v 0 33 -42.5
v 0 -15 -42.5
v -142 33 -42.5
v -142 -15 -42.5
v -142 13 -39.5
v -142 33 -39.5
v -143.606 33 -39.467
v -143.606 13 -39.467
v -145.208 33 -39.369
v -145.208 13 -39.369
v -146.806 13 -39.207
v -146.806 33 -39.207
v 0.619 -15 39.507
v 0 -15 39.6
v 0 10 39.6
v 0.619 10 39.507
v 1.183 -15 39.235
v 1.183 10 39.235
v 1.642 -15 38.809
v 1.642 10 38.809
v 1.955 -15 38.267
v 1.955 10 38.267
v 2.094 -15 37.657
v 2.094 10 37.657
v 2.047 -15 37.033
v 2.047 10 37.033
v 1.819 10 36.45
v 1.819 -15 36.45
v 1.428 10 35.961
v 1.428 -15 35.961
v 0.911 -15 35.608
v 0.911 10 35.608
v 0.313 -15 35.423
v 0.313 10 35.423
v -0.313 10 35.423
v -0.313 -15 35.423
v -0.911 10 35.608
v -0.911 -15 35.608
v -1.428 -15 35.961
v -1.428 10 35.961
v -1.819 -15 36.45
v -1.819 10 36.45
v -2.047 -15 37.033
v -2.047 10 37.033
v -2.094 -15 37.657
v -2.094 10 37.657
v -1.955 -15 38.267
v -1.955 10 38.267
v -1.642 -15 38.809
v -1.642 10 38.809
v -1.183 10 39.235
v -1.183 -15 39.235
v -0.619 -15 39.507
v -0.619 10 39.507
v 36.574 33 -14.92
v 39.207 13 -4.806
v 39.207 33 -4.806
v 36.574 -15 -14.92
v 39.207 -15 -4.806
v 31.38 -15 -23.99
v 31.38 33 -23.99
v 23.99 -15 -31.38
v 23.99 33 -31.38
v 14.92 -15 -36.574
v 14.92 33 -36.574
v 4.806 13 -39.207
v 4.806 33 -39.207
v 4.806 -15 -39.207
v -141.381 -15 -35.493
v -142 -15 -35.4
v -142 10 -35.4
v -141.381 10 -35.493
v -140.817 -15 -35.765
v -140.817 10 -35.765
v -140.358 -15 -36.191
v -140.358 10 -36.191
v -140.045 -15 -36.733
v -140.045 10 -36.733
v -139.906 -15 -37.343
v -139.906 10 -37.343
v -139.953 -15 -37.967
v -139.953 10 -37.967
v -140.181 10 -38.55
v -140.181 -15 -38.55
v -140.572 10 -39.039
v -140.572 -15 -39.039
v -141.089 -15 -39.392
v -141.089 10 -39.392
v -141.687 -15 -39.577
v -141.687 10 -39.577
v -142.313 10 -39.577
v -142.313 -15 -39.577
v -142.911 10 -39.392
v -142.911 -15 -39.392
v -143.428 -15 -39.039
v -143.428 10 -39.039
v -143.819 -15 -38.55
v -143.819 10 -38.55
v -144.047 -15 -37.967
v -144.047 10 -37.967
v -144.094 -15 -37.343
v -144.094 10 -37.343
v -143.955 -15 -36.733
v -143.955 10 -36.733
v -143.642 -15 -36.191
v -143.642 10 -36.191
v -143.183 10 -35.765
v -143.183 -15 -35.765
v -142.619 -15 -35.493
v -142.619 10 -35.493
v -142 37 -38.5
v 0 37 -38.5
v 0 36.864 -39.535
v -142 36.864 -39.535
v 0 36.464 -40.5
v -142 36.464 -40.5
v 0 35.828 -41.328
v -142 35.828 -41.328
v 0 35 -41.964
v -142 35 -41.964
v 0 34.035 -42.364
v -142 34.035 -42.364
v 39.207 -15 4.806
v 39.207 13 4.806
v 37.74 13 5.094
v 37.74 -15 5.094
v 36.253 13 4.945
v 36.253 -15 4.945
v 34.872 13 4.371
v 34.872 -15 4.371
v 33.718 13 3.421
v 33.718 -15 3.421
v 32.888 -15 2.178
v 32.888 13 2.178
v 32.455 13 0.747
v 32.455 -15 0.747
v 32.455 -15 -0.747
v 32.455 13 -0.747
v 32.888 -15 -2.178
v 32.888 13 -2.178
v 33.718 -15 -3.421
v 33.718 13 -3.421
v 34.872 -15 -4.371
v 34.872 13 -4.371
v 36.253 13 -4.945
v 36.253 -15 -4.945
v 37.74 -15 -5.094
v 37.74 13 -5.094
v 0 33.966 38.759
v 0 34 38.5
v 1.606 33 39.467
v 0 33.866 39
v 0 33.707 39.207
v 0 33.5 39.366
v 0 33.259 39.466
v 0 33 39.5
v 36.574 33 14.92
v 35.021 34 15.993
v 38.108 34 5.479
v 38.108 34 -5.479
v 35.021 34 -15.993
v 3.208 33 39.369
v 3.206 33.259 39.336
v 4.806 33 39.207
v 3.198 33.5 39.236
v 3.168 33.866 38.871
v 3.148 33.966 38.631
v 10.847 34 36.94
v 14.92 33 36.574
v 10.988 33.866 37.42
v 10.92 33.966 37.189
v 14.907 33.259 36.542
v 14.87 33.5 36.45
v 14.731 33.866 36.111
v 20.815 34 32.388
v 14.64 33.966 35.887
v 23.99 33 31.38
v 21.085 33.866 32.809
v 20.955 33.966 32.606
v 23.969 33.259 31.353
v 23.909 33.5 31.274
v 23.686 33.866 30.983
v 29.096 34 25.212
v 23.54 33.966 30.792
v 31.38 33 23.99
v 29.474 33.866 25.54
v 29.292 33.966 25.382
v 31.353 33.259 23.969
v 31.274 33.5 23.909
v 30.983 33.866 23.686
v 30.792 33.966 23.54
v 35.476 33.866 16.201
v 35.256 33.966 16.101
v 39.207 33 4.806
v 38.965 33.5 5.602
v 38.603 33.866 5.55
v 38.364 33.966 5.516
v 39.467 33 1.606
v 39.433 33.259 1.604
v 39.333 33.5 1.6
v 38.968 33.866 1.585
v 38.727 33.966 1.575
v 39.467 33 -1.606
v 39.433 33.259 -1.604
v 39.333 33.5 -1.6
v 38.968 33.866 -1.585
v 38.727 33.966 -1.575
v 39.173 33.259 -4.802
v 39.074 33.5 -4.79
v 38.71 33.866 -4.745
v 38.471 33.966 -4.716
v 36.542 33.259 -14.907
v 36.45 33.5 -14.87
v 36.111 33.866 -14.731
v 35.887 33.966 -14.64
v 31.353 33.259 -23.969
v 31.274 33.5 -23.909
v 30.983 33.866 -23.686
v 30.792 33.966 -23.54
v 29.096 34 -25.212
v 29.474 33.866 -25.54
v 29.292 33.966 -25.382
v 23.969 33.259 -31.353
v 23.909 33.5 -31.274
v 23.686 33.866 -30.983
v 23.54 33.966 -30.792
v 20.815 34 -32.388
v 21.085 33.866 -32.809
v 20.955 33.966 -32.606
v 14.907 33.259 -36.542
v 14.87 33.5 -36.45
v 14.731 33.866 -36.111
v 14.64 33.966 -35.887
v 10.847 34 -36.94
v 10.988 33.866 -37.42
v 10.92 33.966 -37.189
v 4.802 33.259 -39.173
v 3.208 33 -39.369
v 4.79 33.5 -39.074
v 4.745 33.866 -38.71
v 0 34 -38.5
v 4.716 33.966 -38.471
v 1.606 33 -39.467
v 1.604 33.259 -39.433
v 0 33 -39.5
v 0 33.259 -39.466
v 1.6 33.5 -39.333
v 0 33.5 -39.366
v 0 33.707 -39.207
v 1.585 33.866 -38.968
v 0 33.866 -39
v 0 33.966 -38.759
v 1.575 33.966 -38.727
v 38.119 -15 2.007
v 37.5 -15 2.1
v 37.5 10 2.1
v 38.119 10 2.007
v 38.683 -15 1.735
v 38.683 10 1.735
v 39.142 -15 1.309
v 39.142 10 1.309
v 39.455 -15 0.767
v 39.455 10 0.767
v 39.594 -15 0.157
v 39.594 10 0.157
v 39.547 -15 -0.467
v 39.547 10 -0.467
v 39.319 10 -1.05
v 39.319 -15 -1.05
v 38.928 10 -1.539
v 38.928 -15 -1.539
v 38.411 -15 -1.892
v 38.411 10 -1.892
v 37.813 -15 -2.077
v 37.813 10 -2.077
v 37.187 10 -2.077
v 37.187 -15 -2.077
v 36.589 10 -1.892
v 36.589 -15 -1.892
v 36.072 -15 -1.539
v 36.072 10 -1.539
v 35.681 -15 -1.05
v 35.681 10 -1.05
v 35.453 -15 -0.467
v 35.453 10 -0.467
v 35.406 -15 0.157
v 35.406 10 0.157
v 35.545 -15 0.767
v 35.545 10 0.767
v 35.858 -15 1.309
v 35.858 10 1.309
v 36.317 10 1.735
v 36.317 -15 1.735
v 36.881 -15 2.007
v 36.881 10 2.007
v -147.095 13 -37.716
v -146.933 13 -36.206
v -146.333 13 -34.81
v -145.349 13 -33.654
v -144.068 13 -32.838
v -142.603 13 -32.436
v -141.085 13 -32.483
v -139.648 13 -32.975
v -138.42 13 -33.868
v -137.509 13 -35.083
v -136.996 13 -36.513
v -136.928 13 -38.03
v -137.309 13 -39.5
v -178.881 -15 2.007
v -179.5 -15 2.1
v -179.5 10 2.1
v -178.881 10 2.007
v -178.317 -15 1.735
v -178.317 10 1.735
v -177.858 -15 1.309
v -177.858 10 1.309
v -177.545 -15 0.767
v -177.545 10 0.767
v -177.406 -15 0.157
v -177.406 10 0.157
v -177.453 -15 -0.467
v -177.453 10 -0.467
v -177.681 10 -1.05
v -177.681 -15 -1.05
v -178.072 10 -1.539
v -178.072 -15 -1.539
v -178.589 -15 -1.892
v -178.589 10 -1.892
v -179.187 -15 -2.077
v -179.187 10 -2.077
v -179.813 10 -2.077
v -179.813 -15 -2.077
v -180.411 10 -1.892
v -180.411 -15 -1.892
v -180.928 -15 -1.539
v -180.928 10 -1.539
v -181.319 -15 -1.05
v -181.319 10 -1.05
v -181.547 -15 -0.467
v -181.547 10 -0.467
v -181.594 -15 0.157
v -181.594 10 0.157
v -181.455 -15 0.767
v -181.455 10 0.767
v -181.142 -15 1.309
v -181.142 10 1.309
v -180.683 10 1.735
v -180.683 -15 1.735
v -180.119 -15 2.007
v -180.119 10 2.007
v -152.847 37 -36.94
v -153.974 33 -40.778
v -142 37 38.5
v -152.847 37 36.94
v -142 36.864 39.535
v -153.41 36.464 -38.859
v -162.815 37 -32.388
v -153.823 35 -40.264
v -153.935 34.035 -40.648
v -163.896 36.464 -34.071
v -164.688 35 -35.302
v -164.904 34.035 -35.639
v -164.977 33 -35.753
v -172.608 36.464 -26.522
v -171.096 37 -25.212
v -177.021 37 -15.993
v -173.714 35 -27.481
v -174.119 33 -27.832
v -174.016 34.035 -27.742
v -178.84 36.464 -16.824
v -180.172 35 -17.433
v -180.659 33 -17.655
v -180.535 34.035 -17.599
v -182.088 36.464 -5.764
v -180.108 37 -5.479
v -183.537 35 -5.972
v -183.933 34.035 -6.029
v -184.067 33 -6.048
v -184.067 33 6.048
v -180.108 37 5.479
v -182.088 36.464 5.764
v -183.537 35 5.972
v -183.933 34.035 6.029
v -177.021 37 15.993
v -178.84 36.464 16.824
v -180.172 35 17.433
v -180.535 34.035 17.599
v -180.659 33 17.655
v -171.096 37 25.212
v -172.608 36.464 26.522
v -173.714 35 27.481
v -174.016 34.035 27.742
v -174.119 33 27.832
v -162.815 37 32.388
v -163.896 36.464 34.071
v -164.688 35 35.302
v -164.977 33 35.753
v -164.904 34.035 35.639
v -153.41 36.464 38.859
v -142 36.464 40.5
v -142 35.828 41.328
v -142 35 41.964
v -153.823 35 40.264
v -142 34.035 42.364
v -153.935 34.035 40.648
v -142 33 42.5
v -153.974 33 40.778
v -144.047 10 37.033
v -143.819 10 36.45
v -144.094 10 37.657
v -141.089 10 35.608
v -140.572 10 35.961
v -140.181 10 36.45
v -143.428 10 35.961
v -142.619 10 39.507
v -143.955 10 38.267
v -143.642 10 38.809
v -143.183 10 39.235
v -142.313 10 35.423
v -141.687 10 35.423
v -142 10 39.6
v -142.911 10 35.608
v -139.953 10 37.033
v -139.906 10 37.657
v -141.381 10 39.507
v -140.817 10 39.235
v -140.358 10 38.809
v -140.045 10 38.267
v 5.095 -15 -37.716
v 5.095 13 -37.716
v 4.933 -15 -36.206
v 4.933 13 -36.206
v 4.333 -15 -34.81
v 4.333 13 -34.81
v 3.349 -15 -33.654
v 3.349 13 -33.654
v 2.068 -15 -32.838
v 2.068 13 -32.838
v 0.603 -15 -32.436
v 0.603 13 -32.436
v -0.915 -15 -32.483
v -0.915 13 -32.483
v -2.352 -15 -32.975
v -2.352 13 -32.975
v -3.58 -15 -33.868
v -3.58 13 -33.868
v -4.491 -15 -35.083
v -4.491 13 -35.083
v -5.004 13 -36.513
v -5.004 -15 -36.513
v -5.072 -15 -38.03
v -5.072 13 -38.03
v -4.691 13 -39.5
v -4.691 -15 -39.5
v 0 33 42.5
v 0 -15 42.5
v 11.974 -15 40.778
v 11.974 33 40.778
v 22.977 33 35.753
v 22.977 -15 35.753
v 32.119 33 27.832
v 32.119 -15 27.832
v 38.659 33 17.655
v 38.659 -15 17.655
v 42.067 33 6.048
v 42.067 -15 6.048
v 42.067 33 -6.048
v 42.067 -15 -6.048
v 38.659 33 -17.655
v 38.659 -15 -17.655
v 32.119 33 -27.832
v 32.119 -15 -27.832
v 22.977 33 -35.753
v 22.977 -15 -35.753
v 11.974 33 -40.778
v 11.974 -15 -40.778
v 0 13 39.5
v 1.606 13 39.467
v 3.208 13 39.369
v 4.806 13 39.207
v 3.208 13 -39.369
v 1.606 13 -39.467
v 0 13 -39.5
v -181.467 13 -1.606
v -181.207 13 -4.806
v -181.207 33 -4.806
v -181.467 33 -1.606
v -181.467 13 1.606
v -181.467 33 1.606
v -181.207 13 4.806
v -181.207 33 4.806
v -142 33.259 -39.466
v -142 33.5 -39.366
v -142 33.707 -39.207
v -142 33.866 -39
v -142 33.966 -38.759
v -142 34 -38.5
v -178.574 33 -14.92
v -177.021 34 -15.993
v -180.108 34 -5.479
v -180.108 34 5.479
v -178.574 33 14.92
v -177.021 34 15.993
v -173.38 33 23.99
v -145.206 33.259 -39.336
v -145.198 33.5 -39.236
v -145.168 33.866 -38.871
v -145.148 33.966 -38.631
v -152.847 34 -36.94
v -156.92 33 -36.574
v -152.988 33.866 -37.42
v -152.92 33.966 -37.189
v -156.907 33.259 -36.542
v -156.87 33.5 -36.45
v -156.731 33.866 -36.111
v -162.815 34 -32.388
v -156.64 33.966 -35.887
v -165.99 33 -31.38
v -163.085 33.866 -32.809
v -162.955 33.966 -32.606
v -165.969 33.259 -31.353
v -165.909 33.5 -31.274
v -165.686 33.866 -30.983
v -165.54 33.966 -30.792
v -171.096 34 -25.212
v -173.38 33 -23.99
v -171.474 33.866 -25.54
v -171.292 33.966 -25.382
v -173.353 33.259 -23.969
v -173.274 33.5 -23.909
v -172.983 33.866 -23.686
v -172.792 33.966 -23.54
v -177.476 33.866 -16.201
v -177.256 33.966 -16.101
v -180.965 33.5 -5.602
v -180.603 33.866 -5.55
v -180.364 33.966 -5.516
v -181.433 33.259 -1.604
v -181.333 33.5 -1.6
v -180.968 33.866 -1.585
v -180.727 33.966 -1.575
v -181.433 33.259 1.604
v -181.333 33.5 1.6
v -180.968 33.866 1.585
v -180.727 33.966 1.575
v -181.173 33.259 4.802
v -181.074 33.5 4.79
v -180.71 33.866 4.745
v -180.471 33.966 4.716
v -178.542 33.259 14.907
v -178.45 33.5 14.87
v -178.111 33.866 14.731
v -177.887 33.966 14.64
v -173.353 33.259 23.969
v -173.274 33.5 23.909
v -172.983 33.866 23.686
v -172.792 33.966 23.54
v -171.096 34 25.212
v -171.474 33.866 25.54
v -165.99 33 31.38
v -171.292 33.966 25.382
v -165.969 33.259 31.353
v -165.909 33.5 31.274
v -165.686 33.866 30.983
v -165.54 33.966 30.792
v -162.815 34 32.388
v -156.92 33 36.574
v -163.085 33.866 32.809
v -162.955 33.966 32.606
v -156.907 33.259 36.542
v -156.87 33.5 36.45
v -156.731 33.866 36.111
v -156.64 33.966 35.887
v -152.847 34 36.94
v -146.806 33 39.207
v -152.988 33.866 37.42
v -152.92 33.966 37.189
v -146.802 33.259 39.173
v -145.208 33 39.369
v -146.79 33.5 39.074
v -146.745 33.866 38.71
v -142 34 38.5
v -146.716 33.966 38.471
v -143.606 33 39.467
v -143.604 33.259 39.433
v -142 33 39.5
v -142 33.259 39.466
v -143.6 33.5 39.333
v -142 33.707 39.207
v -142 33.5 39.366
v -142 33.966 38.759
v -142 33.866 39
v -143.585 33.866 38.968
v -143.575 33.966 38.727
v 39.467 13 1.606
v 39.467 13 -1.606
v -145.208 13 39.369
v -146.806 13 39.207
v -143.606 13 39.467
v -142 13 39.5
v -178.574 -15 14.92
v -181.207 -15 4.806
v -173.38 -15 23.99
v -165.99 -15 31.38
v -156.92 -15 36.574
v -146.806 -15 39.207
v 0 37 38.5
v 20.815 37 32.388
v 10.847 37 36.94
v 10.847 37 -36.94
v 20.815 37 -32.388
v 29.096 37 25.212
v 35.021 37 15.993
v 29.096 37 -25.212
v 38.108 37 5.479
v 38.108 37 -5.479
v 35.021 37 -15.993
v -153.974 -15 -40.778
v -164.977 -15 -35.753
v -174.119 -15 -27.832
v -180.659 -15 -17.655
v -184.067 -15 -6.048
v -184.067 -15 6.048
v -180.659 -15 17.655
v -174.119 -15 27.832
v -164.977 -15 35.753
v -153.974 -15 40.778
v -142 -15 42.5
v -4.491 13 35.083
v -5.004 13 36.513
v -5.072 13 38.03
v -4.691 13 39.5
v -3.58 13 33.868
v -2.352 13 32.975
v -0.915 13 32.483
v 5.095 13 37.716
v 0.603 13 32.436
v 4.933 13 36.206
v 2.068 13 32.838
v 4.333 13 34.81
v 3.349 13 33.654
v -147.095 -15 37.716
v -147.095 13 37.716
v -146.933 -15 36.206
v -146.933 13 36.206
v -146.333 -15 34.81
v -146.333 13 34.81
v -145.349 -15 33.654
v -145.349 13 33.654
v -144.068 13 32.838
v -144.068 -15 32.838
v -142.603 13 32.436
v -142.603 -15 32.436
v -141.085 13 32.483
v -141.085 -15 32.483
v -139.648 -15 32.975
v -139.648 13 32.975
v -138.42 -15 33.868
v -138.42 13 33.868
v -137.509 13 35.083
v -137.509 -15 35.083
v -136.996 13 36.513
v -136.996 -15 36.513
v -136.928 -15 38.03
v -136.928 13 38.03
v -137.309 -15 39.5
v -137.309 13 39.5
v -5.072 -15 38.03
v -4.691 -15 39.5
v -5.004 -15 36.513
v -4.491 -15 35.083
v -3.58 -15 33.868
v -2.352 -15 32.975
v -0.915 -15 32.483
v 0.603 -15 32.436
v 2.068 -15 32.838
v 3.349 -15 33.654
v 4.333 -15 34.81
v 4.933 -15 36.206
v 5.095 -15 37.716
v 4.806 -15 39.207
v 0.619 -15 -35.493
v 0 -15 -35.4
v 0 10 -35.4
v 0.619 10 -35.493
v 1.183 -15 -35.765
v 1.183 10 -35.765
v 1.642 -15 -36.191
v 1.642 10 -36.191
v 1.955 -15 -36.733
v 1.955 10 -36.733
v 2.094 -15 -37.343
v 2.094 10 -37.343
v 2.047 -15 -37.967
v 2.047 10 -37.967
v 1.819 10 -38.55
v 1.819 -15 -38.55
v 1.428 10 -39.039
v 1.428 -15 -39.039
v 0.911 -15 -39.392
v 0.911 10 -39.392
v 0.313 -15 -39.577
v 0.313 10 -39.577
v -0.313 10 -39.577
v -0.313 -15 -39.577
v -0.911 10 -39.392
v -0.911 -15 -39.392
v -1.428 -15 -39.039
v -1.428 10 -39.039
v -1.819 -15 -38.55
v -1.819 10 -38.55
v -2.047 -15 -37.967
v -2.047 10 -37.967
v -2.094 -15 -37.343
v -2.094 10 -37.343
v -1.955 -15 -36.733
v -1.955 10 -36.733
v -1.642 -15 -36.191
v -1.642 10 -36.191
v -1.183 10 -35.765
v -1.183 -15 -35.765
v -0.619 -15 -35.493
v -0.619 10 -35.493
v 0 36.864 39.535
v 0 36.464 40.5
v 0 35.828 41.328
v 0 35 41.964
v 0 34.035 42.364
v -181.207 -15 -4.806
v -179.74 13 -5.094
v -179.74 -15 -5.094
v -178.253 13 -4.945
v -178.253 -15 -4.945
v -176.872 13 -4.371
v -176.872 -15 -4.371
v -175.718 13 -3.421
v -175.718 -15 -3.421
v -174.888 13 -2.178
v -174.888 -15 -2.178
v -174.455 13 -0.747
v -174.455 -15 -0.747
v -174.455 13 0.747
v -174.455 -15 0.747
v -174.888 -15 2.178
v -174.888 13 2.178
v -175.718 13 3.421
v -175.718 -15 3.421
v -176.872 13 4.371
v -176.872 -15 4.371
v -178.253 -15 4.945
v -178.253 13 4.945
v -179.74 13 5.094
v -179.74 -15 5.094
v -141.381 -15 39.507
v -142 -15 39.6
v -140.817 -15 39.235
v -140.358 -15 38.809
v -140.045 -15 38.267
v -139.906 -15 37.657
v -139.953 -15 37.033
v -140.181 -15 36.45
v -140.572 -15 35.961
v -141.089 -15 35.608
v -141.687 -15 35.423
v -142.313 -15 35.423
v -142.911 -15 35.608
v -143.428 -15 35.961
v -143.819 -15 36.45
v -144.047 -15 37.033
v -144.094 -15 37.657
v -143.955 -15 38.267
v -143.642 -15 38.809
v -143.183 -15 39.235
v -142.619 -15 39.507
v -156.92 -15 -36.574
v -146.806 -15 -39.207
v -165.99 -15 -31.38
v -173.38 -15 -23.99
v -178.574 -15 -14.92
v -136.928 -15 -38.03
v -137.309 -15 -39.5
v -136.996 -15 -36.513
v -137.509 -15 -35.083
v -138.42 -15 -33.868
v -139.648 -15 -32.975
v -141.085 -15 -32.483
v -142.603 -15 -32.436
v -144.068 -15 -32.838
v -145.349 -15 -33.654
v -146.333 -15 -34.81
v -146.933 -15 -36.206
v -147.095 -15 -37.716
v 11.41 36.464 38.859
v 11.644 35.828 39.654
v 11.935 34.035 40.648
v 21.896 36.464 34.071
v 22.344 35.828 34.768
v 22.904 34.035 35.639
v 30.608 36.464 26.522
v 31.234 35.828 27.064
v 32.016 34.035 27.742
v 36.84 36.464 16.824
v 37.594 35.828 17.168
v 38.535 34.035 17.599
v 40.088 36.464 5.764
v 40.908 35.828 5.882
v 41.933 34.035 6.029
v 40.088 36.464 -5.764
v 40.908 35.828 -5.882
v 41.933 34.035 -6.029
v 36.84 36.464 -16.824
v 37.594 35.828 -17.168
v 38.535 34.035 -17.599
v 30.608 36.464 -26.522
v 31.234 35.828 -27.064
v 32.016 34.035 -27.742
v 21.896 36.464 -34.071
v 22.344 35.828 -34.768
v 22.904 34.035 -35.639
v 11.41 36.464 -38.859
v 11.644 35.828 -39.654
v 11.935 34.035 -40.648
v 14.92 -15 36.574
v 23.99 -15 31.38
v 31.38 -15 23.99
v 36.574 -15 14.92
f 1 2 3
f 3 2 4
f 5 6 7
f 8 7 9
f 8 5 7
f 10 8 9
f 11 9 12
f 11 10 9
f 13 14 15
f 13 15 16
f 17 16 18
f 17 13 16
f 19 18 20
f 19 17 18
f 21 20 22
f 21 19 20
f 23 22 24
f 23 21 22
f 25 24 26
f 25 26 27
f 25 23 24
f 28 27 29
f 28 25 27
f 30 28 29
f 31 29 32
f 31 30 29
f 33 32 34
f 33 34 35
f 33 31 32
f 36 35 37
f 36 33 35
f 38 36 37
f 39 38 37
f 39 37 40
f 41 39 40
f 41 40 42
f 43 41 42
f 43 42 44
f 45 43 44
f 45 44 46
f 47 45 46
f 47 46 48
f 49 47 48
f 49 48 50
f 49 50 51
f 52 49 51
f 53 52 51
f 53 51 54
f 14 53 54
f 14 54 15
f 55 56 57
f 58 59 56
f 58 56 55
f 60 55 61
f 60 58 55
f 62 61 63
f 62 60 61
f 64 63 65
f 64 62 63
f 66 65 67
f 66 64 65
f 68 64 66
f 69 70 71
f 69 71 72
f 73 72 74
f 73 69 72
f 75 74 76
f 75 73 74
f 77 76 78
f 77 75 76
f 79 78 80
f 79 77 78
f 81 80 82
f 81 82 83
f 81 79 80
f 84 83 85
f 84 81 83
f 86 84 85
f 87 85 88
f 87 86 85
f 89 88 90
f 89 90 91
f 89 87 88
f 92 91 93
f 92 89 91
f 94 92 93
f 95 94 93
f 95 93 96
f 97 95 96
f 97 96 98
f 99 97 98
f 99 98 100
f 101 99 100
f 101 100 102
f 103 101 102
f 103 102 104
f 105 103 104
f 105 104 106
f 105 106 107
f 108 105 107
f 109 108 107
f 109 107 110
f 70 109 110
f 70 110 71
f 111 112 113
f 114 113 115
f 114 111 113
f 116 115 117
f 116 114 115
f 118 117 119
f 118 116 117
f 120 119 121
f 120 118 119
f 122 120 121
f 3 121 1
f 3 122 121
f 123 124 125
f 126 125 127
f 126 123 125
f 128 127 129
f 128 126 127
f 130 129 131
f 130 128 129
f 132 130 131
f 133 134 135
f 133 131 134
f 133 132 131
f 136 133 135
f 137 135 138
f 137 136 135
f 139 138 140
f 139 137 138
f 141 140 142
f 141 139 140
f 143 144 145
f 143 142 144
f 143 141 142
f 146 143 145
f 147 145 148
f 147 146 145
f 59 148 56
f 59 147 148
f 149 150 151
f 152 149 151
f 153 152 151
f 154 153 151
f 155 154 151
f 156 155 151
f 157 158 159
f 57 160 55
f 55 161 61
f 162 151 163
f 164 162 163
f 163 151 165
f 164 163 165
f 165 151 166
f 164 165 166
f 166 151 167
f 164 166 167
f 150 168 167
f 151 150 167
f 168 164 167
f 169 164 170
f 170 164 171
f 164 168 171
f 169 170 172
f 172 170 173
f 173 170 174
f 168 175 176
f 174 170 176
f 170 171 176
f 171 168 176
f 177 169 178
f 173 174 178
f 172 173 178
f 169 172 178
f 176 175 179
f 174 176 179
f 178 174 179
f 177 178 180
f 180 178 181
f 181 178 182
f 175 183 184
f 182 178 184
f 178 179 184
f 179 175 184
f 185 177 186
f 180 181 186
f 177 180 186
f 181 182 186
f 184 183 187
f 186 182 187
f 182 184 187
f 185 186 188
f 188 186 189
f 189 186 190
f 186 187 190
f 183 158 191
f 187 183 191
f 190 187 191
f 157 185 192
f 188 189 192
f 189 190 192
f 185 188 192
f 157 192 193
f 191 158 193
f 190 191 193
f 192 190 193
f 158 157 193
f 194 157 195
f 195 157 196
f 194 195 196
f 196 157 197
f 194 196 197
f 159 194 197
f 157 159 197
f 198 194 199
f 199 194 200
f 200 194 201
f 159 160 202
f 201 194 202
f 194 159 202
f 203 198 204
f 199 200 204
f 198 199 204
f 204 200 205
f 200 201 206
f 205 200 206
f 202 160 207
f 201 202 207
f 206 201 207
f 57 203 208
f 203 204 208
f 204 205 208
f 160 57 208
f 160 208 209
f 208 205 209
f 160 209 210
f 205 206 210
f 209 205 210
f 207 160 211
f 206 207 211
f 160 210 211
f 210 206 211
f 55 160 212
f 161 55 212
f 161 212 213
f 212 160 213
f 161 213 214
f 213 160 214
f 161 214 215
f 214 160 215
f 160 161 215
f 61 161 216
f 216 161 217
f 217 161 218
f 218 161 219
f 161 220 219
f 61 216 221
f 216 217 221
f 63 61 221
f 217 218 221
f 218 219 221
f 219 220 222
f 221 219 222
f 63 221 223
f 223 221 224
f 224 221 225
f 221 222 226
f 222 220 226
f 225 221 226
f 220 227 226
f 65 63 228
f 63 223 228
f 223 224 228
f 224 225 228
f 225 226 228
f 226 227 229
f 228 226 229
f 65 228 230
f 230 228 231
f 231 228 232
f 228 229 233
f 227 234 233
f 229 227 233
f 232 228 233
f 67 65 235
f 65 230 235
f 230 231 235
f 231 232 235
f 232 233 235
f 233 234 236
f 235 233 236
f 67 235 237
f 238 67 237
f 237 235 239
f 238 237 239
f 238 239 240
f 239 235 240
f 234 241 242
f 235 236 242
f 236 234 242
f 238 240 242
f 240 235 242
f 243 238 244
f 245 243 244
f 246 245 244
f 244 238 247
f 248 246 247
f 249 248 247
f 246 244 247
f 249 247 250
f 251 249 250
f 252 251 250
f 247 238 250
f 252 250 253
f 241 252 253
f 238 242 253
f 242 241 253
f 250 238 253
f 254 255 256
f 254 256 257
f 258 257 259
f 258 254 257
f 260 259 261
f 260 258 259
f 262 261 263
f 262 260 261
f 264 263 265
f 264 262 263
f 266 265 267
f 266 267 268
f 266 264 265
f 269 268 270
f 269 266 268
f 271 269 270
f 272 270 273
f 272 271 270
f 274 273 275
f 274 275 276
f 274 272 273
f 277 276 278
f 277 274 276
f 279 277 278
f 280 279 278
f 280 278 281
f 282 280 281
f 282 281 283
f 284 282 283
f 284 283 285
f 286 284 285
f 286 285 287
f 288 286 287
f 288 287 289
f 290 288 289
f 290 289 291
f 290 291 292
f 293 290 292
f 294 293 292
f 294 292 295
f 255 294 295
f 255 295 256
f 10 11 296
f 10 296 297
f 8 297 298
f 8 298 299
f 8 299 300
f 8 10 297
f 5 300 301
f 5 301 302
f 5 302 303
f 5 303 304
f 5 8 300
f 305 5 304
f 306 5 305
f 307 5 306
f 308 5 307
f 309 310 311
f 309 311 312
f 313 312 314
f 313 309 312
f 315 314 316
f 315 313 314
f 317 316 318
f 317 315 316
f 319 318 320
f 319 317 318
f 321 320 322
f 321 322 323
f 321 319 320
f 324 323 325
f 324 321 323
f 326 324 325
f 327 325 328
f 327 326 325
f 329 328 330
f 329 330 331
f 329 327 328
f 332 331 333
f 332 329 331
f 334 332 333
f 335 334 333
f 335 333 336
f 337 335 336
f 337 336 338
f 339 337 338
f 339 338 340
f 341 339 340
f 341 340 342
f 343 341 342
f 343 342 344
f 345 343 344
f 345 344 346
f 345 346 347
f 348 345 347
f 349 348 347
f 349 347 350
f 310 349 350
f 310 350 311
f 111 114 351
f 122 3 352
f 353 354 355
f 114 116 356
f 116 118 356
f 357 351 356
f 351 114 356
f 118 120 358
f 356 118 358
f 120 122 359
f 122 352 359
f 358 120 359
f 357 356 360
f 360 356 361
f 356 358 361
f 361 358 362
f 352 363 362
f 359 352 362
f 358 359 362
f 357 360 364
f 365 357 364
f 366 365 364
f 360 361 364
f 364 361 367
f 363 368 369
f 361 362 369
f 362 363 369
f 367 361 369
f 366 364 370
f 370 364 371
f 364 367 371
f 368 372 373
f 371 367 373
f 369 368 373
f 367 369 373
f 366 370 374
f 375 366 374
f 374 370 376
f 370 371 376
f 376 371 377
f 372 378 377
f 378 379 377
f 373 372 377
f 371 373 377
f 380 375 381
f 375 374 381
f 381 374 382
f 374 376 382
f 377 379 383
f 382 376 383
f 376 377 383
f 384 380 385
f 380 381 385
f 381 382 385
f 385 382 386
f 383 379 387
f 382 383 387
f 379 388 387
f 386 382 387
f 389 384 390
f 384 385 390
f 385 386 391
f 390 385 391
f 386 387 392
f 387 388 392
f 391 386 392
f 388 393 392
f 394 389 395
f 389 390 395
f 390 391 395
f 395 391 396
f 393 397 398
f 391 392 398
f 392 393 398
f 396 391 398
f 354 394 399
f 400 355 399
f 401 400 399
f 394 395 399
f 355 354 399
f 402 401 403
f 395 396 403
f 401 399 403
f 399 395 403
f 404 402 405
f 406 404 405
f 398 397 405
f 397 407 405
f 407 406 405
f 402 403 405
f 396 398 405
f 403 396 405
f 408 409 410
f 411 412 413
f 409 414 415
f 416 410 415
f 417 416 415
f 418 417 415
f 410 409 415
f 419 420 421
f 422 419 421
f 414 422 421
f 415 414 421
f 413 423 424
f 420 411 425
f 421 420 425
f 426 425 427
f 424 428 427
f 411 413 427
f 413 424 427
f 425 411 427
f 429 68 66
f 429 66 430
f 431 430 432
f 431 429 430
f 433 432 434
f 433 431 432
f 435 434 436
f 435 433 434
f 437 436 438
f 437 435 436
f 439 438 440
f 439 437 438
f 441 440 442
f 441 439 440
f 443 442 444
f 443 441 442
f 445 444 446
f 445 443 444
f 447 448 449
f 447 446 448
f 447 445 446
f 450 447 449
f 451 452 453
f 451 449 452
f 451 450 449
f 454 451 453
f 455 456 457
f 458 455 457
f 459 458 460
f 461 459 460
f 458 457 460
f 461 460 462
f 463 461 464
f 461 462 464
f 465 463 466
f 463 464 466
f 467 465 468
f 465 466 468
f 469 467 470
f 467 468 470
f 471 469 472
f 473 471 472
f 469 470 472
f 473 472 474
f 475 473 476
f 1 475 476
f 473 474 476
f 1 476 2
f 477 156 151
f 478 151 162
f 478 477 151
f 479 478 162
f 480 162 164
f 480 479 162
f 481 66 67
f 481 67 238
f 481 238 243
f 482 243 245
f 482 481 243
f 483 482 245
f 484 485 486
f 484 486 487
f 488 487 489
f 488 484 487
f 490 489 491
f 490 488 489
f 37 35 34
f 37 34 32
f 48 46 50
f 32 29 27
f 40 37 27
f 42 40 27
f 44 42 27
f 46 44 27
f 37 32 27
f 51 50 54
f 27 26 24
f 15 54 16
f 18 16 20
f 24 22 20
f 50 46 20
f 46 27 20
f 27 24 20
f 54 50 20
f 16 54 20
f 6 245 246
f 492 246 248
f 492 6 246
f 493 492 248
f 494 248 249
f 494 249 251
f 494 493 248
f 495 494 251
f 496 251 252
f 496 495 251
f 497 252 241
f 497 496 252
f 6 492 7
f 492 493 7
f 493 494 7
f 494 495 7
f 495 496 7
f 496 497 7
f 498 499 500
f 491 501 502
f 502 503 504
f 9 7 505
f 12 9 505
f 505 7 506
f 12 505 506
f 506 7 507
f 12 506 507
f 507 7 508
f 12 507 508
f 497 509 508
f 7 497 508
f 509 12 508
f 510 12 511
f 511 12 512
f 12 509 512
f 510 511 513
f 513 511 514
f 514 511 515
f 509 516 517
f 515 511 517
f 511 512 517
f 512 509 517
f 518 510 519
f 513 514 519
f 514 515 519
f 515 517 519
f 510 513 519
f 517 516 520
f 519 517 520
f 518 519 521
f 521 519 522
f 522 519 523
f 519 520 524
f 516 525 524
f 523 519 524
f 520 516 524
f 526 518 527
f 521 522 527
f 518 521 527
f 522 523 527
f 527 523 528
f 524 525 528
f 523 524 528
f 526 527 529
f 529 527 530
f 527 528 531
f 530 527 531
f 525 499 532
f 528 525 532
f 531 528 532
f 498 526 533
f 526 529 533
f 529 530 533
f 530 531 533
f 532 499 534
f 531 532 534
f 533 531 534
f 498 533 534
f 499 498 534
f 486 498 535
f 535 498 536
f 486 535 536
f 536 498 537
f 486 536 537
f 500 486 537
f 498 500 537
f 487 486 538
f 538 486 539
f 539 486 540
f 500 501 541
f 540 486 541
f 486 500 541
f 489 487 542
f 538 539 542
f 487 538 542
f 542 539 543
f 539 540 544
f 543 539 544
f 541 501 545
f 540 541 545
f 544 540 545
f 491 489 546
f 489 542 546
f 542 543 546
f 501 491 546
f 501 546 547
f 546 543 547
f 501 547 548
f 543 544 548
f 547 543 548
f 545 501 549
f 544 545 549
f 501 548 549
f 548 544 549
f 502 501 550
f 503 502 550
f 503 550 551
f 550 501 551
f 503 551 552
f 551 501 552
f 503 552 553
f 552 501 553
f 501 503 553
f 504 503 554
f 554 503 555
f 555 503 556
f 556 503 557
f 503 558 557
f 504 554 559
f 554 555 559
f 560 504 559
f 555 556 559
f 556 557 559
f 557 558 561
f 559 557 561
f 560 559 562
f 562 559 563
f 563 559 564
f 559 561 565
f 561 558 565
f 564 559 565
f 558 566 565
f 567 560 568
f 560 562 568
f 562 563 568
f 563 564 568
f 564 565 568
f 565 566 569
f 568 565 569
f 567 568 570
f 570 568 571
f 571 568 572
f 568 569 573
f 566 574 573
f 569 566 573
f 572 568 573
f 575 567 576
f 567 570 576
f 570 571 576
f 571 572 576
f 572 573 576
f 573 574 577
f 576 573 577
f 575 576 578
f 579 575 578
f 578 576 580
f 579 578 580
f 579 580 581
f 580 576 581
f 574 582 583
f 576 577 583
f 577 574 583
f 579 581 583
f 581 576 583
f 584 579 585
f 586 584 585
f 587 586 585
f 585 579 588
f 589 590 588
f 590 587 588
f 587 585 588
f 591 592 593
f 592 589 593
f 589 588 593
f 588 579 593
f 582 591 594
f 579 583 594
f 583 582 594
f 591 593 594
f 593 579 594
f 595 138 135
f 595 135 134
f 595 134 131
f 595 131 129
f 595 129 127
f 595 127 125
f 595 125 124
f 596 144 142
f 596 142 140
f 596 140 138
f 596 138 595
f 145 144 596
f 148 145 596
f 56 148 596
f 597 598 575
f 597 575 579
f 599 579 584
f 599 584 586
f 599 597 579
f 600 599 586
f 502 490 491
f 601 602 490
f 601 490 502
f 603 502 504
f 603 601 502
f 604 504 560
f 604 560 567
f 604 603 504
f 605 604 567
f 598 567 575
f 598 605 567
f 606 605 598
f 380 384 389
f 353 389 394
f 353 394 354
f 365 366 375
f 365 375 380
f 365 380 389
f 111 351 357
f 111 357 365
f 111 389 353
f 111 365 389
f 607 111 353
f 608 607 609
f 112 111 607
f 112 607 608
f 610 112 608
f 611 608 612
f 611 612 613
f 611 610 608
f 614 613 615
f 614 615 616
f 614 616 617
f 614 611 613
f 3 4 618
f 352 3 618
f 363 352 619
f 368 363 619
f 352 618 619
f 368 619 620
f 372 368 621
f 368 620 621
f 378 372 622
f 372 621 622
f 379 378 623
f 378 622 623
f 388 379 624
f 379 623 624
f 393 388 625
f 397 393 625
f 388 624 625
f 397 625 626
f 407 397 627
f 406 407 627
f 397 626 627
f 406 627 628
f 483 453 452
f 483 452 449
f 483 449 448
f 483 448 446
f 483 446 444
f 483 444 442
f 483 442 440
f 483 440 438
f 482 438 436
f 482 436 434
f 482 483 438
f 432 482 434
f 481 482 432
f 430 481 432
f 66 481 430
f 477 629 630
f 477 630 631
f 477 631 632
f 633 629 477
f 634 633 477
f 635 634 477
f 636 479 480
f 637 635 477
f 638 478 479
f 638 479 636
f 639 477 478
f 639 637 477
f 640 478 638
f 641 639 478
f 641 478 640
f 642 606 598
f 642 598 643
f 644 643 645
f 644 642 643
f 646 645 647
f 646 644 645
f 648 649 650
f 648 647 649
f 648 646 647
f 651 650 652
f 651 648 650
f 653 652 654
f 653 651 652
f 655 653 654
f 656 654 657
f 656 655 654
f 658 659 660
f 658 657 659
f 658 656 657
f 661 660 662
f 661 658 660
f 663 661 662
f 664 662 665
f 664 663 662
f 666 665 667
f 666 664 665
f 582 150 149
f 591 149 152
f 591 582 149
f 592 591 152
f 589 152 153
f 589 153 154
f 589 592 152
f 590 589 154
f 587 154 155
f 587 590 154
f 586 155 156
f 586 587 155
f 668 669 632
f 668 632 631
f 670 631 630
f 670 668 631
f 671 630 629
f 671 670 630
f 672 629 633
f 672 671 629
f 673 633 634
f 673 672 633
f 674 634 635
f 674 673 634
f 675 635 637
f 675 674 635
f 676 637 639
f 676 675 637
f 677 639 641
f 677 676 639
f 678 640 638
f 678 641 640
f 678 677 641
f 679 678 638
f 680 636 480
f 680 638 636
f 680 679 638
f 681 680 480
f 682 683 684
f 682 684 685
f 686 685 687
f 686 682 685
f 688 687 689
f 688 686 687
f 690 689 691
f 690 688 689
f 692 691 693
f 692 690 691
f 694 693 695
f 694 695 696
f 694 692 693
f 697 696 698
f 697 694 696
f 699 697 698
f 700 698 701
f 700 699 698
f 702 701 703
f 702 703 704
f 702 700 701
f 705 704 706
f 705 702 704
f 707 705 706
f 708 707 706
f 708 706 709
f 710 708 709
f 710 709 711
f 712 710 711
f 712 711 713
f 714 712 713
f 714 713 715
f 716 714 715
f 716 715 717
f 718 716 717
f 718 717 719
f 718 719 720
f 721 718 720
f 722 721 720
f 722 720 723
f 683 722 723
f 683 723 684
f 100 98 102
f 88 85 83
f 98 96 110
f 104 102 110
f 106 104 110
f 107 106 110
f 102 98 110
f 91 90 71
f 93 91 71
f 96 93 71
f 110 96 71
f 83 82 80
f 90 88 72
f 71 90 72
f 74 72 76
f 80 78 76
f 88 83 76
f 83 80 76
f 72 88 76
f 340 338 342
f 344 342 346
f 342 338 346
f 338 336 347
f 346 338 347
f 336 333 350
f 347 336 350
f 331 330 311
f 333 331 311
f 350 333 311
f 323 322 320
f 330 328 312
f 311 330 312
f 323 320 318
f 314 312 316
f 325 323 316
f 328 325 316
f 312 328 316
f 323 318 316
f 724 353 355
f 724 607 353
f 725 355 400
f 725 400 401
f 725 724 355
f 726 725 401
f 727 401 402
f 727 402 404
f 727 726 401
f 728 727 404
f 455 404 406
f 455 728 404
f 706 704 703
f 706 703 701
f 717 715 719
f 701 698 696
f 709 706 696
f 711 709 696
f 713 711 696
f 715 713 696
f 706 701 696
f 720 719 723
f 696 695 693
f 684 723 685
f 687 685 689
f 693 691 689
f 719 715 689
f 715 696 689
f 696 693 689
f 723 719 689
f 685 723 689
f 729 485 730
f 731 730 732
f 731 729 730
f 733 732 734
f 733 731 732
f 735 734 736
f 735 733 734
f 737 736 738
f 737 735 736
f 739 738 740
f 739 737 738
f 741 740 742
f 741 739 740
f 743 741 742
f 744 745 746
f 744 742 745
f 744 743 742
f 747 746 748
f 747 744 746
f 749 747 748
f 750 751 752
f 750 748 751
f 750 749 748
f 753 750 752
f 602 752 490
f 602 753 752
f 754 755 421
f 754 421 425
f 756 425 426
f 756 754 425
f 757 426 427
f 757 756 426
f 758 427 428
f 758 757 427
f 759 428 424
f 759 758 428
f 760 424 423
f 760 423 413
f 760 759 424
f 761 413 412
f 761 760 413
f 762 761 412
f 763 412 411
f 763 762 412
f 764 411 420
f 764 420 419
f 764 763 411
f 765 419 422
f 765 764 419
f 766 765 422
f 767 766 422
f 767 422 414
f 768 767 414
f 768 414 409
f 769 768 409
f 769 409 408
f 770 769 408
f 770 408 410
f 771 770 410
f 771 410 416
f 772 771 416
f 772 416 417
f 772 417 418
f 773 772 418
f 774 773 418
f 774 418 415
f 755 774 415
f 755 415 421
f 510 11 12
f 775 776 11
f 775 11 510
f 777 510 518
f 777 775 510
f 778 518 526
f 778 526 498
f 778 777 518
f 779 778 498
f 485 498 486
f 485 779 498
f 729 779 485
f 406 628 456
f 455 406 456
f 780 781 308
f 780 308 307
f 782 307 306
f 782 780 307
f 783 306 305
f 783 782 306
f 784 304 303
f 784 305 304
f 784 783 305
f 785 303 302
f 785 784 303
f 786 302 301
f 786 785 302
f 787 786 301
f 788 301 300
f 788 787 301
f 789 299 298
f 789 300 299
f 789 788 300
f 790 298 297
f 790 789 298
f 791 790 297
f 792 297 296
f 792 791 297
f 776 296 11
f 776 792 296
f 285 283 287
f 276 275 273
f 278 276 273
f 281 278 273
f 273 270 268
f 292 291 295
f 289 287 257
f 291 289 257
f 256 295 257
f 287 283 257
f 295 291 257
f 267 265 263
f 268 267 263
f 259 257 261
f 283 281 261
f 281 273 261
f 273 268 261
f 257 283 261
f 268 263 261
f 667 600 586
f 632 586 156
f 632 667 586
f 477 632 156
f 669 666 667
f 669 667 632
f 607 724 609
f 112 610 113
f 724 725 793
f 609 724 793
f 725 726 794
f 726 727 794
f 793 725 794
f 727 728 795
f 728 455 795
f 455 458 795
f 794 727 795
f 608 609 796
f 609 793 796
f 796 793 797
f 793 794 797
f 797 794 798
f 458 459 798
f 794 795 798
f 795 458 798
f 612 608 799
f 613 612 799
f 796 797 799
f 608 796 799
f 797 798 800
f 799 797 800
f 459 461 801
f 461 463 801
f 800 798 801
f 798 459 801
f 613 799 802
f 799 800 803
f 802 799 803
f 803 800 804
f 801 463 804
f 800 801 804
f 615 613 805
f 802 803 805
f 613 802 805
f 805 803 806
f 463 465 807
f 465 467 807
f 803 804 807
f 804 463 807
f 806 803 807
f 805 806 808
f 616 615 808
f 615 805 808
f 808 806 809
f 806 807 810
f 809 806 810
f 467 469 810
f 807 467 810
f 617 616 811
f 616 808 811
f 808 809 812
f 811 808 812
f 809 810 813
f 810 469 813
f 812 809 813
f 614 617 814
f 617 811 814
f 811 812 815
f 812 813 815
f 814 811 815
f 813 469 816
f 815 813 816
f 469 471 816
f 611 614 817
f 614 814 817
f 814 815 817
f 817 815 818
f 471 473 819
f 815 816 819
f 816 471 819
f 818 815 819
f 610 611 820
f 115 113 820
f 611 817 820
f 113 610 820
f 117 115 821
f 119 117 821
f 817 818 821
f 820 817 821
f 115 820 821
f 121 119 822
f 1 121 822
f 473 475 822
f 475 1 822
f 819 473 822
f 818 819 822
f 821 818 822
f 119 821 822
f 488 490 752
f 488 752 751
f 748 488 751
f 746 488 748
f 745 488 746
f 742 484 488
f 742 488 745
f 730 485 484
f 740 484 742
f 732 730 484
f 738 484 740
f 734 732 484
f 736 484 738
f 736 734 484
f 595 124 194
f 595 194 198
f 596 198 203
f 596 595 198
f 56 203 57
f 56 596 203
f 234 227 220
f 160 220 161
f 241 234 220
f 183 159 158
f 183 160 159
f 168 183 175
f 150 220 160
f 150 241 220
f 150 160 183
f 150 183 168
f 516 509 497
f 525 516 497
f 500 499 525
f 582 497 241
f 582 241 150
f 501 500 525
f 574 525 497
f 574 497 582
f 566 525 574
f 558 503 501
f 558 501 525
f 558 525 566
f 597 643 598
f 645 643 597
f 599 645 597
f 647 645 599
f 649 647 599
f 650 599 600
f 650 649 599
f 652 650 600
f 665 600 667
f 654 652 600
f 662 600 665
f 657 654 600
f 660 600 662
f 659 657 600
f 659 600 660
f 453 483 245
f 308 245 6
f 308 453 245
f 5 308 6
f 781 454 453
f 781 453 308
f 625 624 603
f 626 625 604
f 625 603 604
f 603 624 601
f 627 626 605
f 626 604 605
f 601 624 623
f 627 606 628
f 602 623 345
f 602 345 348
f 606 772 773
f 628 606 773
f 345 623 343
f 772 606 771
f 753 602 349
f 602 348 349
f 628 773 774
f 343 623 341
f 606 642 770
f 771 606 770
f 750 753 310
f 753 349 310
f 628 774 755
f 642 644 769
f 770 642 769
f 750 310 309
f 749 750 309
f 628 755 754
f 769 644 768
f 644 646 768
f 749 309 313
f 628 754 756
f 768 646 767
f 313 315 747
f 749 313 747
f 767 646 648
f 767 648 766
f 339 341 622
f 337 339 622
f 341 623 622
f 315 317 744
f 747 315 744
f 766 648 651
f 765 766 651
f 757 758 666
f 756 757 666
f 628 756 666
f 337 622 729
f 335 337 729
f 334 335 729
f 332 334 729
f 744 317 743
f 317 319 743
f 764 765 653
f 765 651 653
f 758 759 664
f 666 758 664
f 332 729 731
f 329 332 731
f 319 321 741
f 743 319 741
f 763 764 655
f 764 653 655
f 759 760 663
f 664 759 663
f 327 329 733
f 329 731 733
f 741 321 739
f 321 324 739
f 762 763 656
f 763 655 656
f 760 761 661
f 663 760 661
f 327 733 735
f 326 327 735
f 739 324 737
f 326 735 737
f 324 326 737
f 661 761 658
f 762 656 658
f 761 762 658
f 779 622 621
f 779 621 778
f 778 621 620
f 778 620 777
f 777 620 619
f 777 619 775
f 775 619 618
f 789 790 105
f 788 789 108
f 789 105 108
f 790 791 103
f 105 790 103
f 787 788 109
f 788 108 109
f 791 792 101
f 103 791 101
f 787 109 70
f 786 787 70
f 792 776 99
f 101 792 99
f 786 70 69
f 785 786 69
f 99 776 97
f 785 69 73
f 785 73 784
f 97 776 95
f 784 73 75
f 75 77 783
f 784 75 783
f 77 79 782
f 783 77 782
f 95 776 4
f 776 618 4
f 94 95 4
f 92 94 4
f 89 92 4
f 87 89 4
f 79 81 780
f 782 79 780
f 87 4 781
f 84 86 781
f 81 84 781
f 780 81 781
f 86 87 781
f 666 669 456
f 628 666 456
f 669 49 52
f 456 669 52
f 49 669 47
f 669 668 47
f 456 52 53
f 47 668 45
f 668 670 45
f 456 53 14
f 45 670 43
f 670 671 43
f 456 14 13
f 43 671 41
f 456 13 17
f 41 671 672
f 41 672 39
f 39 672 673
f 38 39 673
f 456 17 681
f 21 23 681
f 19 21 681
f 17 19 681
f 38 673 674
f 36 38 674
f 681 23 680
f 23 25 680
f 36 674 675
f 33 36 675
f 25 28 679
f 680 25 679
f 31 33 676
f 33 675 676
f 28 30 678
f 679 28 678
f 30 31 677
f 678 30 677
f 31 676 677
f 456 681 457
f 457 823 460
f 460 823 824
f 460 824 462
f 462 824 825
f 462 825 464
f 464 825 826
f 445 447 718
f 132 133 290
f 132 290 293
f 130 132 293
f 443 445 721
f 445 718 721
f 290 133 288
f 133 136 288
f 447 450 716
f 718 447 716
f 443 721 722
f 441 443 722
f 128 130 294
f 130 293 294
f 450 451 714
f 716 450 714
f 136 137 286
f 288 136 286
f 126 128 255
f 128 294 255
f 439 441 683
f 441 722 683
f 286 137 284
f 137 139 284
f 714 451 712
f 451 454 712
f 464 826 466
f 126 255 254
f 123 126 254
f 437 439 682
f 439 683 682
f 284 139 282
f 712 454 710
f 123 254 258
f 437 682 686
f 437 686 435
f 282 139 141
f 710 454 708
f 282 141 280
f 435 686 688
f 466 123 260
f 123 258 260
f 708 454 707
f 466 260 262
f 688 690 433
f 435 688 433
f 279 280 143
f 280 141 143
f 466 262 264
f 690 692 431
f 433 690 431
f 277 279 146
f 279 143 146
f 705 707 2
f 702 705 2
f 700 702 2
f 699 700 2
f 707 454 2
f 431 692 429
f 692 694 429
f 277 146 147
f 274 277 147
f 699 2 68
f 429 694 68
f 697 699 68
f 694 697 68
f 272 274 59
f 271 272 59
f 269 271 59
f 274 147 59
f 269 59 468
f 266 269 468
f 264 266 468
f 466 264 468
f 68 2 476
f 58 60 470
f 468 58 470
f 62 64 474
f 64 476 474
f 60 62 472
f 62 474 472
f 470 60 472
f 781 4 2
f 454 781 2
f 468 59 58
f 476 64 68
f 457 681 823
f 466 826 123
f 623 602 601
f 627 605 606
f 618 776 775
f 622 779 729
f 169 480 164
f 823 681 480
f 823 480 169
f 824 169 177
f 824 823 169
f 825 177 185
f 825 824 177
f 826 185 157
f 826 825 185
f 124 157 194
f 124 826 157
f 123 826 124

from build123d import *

# Parameters (mm, degrees)
BOSS_EXTRUDE1_DEPTH      = 37
BOSS_EXTRUDE1_DEPTH_BACK = 15
CUT_EXTRUDE1_DEPTH       = 10
CUT_EXTRUDE1_DEPTH_BACK  = 20
SKETCH2_R                = 2.1
FILLET1_R                = 4
SHELL2_START             = -15
SHELL2_DEPTH             = 47.999999899
SHELL2_START_2           = 13
SHELL2_2_DEPTH           = 19.999999899
SHELL2_START_3           = -142
SHELL2_3_DEPTH           = 142
SHELL2_4_ANGLE           = 180
SHELL2_5_ANGLE           = 180


with BuildPart() as part:
    # Sketch1 → Boss-Extrude1 (new, two sides: drawn at the far end of the back side and taken through both)
    with BuildSketch(Plane(origin=(0, 0, 0), x_dir=(1, 0, 0), z_dir=(0, 1, 0)).offset(-BOSS_EXTRUDE1_DEPTH_BACK)):
        with BuildLine():
            Line((0, 42.5), (-142, 42.5))
            ThreePointArc((-142, 42.5), (-184.5, 0), (-142, -42.5))
            Line((-142, -42.5), (0, -42.5))
            ThreePointArc((0, -42.5), (42.5, 0), (0, 42.5))
        make_face()
    extrude(amount=BOSS_EXTRUDE1_DEPTH + BOSS_EXTRUDE1_DEPTH_BACK)

    # Sketch2 → Cut-Extrude1 (cut, two sides: drawn at the far end of the back side and taken through both)
    with BuildSketch(Plane(origin=(0, 0, 0), x_dir=(1, 0, 0), z_dir=(0, 1, 0)).offset(-CUT_EXTRUDE1_DEPTH_BACK)):
        with Locations(Location((-142, 37.5, 0), (0, 0, 270))):
            Circle(SKETCH2_R)
        with Locations(Location((-179.5, 0, 0), (0, 0, 270))):
            Circle(SKETCH2_R)
        with Locations(Location((-142, -37.5, 0), (0, 0, 270))):
            Circle(SKETCH2_R)
        with Locations(Location((0, -37.5, 0), (0, 0, 270))):
            Circle(SKETCH2_R)
        with Locations(Location((37.5, 0, 0), (0, 0, 270))):
            Circle(SKETCH2_R)
        with Locations(Location((0, 37.5, 0), (0, 0, 270))):
            Circle(SKETCH2_R)
    extrude(amount=CUT_EXTRUDE1_DEPTH + CUT_EXTRUDE1_DEPTH_BACK, mode=Mode.SUBTRACT)

    # Fillet1
    fillet1_edges = [part.edges().sort_by_distance(p)[0] for p in [
        (-71, 37, 42.5),
        (42.5, 37, 0),
        (-71, 37, -42.5),
        (-184.5, 37, 0),
    ]]
    fillet(fillet1_edges, radius=FILLET1_R)

    # Shell2: read off the stored shape, not the designer's step
    # Shell2 outline → Shell2 (cut)
    with BuildSketch(Plane(origin=(0, 0, 0), x_dir=(1, 0, 0), z_dir=(0, 1, 0)).offset(SHELL2_START)):
        with BuildLine():
            ThreePointArc((4.806011234, 39.206533333), (-0.157511676, 32.402432926), (-4.691481642, 39.5))
            Line((-4.691481642, 39.5), (-137.308518358, 39.5))
            ThreePointArc((-137.308518358, 39.5), (-141.842488324, 32.402432926), (-146.806011234, 39.206533333))
            ThreePointArc((-146.806011234, 39.206533333), (-169.930717857, 27.930717857), (-181.206533333, 4.806011234))
            ThreePointArc((-181.206533333, 4.806011234), (-174.4, 0), (-181.206533333, -4.806011234))
            ThreePointArc((-181.206533333, -4.806011234), (-169.930717857, -27.930717857), (-146.806011234, -39.206533333))
            ThreePointArc((-146.806011234, -39.206533333), (-141.842488324, -32.402432926), (-137.308518358, -39.5))
            Line((-137.308518358, -39.5), (-4.691481642, -39.5))
            ThreePointArc((-4.691481642, -39.5), (-0.157511676, -32.402432926), (4.806011234, -39.206533333))
            ThreePointArc((4.806011234, -39.206533333), (27.930717857, -27.930717857), (39.206533333, -4.806011234))
            ThreePointArc((39.206533333, -4.806011234), (32.4, 0), (39.206533333, 4.806011234))
            ThreePointArc((39.206533333, 4.806011234), (27.930717857, 27.930717857), (4.806011234, 39.206533333))
        make_face()
    extrude(amount=SHELL2_DEPTH, mode=Mode.SUBTRACT)

    # Shell2 2 outline → Shell2 2 (cut)
    with BuildSketch(Plane(origin=(0, 0, 0), x_dir=(1, 0, 0), z_dir=(0, 1, 0)).offset(SHELL2_START_2)):
        with BuildLine():
            ThreePointArc((4.806011234, 39.206533333), (2.407481395, 39.426565071), (0, 39.5))
            Line((0, 39.5), (-4.691481642, 39.5))
            ThreePointArc((-4.691481642, 39.5), (-0.157511676, 32.402432926), (4.806011234, 39.206533333))
        make_face()
        with BuildLine():
            ThreePointArc((-146.806011234, 39.206533333), (-141.842488324, 32.402432926), (-137.308518358, 39.5))
            Line((-137.308518358, 39.5), (-142, 39.5))
            ThreePointArc((-142, 39.5), (-144.407481395, 39.426565071), (-146.806011234, 39.206533333))
        make_face()
        with BuildLine():
            ThreePointArc((39.206533333, -4.806011234), (39.5, 0), (39.206533333, 4.806011234))
            ThreePointArc((39.206533333, 4.806011234), (32.4, 0), (39.206533333, -4.806011234))
        make_face()
        with BuildLine():
            ThreePointArc((-181.206533333, -4.806011234), (-174.4, 0), (-181.206533333, 4.806011234))
            ThreePointArc((-181.206533333, 4.806011234), (-181.5, 0), (-181.206533333, -4.806011234))
        make_face()
        with BuildLine():
            ThreePointArc((0, -39.5), (2.407481395, -39.426565071), (4.806011234, -39.206533333))
            ThreePointArc((4.806011234, -39.206533333), (-0.157511676, -32.402432926), (-4.691481642, -39.5))
            Line((-4.691481642, -39.5), (0, -39.5))
        make_face()
        with BuildLine():
            ThreePointArc((-137.308518358, -39.5), (-141.842488324, -32.402432926), (-146.806011234, -39.206533333))
            ThreePointArc((-146.806011234, -39.206533333), (-144.407481395, -39.426565071), (-142, -39.5))
            Line((-142, -39.5), (-137.308518358, -39.5))
        make_face()
    extrude(amount=SHELL2_2_DEPTH, mode=Mode.SUBTRACT)

    # Shell2 3 outline → Shell2 3 (cut)
    with BuildSketch(Plane.YZ.offset(SHELL2_START_3)):
        with BuildLine():
            ThreePointArc((33, -39.5), (33.707106781, -39.207106781), (34, -38.5))
            Line((34, -38.5), (34, 38.5))
            ThreePointArc((34, 38.5), (33.707106781, 39.207106781), (33, 39.5))
            Line((33, 39.5), (33, -39.5))
        make_face()
    extrude(amount=SHELL2_3_DEPTH, mode=Mode.SUBTRACT)

    # Shell2 4 outline → Shell2 4 (revolve, cut)
    with BuildSketch(Plane(origin=(-142, 0, 0), x_dir=(0, 0, -1), z_dir=(1, 0, 0))):
        with BuildLine():
            ThreePointArc((39.5, 33), (39.207106781, 33.707106781), (38.5, 34))
            Line((38.5, 34), (0, 34))
            Line((0, 34), (0, 33))
            Line((0, 33), (39.5, 33))
        make_face()
    revolve(axis=Axis((-142, 0, 0), (0, 1, 0)), revolution_arc=SHELL2_4_ANGLE, mode=Mode.SUBTRACT)

    # Shell2 5 outline → Shell2 5 (revolve, cut)
    with BuildSketch(Plane.ZY):
        with BuildLine():
            ThreePointArc((39.5, 33), (39.207106781, 33.707106781), (38.5, 34))
            Line((38.5, 34), (0, 34))
            Line((0, 34), (0, 33))
            Line((0, 33), (39.5, 33))
        make_face()
    revolve(axis=Axis((0, 0, 0), (0, 1, 0)), revolution_arc=SHELL2_5_ANGLE, mode=Mode.SUBTRACT)


solid = part.part
